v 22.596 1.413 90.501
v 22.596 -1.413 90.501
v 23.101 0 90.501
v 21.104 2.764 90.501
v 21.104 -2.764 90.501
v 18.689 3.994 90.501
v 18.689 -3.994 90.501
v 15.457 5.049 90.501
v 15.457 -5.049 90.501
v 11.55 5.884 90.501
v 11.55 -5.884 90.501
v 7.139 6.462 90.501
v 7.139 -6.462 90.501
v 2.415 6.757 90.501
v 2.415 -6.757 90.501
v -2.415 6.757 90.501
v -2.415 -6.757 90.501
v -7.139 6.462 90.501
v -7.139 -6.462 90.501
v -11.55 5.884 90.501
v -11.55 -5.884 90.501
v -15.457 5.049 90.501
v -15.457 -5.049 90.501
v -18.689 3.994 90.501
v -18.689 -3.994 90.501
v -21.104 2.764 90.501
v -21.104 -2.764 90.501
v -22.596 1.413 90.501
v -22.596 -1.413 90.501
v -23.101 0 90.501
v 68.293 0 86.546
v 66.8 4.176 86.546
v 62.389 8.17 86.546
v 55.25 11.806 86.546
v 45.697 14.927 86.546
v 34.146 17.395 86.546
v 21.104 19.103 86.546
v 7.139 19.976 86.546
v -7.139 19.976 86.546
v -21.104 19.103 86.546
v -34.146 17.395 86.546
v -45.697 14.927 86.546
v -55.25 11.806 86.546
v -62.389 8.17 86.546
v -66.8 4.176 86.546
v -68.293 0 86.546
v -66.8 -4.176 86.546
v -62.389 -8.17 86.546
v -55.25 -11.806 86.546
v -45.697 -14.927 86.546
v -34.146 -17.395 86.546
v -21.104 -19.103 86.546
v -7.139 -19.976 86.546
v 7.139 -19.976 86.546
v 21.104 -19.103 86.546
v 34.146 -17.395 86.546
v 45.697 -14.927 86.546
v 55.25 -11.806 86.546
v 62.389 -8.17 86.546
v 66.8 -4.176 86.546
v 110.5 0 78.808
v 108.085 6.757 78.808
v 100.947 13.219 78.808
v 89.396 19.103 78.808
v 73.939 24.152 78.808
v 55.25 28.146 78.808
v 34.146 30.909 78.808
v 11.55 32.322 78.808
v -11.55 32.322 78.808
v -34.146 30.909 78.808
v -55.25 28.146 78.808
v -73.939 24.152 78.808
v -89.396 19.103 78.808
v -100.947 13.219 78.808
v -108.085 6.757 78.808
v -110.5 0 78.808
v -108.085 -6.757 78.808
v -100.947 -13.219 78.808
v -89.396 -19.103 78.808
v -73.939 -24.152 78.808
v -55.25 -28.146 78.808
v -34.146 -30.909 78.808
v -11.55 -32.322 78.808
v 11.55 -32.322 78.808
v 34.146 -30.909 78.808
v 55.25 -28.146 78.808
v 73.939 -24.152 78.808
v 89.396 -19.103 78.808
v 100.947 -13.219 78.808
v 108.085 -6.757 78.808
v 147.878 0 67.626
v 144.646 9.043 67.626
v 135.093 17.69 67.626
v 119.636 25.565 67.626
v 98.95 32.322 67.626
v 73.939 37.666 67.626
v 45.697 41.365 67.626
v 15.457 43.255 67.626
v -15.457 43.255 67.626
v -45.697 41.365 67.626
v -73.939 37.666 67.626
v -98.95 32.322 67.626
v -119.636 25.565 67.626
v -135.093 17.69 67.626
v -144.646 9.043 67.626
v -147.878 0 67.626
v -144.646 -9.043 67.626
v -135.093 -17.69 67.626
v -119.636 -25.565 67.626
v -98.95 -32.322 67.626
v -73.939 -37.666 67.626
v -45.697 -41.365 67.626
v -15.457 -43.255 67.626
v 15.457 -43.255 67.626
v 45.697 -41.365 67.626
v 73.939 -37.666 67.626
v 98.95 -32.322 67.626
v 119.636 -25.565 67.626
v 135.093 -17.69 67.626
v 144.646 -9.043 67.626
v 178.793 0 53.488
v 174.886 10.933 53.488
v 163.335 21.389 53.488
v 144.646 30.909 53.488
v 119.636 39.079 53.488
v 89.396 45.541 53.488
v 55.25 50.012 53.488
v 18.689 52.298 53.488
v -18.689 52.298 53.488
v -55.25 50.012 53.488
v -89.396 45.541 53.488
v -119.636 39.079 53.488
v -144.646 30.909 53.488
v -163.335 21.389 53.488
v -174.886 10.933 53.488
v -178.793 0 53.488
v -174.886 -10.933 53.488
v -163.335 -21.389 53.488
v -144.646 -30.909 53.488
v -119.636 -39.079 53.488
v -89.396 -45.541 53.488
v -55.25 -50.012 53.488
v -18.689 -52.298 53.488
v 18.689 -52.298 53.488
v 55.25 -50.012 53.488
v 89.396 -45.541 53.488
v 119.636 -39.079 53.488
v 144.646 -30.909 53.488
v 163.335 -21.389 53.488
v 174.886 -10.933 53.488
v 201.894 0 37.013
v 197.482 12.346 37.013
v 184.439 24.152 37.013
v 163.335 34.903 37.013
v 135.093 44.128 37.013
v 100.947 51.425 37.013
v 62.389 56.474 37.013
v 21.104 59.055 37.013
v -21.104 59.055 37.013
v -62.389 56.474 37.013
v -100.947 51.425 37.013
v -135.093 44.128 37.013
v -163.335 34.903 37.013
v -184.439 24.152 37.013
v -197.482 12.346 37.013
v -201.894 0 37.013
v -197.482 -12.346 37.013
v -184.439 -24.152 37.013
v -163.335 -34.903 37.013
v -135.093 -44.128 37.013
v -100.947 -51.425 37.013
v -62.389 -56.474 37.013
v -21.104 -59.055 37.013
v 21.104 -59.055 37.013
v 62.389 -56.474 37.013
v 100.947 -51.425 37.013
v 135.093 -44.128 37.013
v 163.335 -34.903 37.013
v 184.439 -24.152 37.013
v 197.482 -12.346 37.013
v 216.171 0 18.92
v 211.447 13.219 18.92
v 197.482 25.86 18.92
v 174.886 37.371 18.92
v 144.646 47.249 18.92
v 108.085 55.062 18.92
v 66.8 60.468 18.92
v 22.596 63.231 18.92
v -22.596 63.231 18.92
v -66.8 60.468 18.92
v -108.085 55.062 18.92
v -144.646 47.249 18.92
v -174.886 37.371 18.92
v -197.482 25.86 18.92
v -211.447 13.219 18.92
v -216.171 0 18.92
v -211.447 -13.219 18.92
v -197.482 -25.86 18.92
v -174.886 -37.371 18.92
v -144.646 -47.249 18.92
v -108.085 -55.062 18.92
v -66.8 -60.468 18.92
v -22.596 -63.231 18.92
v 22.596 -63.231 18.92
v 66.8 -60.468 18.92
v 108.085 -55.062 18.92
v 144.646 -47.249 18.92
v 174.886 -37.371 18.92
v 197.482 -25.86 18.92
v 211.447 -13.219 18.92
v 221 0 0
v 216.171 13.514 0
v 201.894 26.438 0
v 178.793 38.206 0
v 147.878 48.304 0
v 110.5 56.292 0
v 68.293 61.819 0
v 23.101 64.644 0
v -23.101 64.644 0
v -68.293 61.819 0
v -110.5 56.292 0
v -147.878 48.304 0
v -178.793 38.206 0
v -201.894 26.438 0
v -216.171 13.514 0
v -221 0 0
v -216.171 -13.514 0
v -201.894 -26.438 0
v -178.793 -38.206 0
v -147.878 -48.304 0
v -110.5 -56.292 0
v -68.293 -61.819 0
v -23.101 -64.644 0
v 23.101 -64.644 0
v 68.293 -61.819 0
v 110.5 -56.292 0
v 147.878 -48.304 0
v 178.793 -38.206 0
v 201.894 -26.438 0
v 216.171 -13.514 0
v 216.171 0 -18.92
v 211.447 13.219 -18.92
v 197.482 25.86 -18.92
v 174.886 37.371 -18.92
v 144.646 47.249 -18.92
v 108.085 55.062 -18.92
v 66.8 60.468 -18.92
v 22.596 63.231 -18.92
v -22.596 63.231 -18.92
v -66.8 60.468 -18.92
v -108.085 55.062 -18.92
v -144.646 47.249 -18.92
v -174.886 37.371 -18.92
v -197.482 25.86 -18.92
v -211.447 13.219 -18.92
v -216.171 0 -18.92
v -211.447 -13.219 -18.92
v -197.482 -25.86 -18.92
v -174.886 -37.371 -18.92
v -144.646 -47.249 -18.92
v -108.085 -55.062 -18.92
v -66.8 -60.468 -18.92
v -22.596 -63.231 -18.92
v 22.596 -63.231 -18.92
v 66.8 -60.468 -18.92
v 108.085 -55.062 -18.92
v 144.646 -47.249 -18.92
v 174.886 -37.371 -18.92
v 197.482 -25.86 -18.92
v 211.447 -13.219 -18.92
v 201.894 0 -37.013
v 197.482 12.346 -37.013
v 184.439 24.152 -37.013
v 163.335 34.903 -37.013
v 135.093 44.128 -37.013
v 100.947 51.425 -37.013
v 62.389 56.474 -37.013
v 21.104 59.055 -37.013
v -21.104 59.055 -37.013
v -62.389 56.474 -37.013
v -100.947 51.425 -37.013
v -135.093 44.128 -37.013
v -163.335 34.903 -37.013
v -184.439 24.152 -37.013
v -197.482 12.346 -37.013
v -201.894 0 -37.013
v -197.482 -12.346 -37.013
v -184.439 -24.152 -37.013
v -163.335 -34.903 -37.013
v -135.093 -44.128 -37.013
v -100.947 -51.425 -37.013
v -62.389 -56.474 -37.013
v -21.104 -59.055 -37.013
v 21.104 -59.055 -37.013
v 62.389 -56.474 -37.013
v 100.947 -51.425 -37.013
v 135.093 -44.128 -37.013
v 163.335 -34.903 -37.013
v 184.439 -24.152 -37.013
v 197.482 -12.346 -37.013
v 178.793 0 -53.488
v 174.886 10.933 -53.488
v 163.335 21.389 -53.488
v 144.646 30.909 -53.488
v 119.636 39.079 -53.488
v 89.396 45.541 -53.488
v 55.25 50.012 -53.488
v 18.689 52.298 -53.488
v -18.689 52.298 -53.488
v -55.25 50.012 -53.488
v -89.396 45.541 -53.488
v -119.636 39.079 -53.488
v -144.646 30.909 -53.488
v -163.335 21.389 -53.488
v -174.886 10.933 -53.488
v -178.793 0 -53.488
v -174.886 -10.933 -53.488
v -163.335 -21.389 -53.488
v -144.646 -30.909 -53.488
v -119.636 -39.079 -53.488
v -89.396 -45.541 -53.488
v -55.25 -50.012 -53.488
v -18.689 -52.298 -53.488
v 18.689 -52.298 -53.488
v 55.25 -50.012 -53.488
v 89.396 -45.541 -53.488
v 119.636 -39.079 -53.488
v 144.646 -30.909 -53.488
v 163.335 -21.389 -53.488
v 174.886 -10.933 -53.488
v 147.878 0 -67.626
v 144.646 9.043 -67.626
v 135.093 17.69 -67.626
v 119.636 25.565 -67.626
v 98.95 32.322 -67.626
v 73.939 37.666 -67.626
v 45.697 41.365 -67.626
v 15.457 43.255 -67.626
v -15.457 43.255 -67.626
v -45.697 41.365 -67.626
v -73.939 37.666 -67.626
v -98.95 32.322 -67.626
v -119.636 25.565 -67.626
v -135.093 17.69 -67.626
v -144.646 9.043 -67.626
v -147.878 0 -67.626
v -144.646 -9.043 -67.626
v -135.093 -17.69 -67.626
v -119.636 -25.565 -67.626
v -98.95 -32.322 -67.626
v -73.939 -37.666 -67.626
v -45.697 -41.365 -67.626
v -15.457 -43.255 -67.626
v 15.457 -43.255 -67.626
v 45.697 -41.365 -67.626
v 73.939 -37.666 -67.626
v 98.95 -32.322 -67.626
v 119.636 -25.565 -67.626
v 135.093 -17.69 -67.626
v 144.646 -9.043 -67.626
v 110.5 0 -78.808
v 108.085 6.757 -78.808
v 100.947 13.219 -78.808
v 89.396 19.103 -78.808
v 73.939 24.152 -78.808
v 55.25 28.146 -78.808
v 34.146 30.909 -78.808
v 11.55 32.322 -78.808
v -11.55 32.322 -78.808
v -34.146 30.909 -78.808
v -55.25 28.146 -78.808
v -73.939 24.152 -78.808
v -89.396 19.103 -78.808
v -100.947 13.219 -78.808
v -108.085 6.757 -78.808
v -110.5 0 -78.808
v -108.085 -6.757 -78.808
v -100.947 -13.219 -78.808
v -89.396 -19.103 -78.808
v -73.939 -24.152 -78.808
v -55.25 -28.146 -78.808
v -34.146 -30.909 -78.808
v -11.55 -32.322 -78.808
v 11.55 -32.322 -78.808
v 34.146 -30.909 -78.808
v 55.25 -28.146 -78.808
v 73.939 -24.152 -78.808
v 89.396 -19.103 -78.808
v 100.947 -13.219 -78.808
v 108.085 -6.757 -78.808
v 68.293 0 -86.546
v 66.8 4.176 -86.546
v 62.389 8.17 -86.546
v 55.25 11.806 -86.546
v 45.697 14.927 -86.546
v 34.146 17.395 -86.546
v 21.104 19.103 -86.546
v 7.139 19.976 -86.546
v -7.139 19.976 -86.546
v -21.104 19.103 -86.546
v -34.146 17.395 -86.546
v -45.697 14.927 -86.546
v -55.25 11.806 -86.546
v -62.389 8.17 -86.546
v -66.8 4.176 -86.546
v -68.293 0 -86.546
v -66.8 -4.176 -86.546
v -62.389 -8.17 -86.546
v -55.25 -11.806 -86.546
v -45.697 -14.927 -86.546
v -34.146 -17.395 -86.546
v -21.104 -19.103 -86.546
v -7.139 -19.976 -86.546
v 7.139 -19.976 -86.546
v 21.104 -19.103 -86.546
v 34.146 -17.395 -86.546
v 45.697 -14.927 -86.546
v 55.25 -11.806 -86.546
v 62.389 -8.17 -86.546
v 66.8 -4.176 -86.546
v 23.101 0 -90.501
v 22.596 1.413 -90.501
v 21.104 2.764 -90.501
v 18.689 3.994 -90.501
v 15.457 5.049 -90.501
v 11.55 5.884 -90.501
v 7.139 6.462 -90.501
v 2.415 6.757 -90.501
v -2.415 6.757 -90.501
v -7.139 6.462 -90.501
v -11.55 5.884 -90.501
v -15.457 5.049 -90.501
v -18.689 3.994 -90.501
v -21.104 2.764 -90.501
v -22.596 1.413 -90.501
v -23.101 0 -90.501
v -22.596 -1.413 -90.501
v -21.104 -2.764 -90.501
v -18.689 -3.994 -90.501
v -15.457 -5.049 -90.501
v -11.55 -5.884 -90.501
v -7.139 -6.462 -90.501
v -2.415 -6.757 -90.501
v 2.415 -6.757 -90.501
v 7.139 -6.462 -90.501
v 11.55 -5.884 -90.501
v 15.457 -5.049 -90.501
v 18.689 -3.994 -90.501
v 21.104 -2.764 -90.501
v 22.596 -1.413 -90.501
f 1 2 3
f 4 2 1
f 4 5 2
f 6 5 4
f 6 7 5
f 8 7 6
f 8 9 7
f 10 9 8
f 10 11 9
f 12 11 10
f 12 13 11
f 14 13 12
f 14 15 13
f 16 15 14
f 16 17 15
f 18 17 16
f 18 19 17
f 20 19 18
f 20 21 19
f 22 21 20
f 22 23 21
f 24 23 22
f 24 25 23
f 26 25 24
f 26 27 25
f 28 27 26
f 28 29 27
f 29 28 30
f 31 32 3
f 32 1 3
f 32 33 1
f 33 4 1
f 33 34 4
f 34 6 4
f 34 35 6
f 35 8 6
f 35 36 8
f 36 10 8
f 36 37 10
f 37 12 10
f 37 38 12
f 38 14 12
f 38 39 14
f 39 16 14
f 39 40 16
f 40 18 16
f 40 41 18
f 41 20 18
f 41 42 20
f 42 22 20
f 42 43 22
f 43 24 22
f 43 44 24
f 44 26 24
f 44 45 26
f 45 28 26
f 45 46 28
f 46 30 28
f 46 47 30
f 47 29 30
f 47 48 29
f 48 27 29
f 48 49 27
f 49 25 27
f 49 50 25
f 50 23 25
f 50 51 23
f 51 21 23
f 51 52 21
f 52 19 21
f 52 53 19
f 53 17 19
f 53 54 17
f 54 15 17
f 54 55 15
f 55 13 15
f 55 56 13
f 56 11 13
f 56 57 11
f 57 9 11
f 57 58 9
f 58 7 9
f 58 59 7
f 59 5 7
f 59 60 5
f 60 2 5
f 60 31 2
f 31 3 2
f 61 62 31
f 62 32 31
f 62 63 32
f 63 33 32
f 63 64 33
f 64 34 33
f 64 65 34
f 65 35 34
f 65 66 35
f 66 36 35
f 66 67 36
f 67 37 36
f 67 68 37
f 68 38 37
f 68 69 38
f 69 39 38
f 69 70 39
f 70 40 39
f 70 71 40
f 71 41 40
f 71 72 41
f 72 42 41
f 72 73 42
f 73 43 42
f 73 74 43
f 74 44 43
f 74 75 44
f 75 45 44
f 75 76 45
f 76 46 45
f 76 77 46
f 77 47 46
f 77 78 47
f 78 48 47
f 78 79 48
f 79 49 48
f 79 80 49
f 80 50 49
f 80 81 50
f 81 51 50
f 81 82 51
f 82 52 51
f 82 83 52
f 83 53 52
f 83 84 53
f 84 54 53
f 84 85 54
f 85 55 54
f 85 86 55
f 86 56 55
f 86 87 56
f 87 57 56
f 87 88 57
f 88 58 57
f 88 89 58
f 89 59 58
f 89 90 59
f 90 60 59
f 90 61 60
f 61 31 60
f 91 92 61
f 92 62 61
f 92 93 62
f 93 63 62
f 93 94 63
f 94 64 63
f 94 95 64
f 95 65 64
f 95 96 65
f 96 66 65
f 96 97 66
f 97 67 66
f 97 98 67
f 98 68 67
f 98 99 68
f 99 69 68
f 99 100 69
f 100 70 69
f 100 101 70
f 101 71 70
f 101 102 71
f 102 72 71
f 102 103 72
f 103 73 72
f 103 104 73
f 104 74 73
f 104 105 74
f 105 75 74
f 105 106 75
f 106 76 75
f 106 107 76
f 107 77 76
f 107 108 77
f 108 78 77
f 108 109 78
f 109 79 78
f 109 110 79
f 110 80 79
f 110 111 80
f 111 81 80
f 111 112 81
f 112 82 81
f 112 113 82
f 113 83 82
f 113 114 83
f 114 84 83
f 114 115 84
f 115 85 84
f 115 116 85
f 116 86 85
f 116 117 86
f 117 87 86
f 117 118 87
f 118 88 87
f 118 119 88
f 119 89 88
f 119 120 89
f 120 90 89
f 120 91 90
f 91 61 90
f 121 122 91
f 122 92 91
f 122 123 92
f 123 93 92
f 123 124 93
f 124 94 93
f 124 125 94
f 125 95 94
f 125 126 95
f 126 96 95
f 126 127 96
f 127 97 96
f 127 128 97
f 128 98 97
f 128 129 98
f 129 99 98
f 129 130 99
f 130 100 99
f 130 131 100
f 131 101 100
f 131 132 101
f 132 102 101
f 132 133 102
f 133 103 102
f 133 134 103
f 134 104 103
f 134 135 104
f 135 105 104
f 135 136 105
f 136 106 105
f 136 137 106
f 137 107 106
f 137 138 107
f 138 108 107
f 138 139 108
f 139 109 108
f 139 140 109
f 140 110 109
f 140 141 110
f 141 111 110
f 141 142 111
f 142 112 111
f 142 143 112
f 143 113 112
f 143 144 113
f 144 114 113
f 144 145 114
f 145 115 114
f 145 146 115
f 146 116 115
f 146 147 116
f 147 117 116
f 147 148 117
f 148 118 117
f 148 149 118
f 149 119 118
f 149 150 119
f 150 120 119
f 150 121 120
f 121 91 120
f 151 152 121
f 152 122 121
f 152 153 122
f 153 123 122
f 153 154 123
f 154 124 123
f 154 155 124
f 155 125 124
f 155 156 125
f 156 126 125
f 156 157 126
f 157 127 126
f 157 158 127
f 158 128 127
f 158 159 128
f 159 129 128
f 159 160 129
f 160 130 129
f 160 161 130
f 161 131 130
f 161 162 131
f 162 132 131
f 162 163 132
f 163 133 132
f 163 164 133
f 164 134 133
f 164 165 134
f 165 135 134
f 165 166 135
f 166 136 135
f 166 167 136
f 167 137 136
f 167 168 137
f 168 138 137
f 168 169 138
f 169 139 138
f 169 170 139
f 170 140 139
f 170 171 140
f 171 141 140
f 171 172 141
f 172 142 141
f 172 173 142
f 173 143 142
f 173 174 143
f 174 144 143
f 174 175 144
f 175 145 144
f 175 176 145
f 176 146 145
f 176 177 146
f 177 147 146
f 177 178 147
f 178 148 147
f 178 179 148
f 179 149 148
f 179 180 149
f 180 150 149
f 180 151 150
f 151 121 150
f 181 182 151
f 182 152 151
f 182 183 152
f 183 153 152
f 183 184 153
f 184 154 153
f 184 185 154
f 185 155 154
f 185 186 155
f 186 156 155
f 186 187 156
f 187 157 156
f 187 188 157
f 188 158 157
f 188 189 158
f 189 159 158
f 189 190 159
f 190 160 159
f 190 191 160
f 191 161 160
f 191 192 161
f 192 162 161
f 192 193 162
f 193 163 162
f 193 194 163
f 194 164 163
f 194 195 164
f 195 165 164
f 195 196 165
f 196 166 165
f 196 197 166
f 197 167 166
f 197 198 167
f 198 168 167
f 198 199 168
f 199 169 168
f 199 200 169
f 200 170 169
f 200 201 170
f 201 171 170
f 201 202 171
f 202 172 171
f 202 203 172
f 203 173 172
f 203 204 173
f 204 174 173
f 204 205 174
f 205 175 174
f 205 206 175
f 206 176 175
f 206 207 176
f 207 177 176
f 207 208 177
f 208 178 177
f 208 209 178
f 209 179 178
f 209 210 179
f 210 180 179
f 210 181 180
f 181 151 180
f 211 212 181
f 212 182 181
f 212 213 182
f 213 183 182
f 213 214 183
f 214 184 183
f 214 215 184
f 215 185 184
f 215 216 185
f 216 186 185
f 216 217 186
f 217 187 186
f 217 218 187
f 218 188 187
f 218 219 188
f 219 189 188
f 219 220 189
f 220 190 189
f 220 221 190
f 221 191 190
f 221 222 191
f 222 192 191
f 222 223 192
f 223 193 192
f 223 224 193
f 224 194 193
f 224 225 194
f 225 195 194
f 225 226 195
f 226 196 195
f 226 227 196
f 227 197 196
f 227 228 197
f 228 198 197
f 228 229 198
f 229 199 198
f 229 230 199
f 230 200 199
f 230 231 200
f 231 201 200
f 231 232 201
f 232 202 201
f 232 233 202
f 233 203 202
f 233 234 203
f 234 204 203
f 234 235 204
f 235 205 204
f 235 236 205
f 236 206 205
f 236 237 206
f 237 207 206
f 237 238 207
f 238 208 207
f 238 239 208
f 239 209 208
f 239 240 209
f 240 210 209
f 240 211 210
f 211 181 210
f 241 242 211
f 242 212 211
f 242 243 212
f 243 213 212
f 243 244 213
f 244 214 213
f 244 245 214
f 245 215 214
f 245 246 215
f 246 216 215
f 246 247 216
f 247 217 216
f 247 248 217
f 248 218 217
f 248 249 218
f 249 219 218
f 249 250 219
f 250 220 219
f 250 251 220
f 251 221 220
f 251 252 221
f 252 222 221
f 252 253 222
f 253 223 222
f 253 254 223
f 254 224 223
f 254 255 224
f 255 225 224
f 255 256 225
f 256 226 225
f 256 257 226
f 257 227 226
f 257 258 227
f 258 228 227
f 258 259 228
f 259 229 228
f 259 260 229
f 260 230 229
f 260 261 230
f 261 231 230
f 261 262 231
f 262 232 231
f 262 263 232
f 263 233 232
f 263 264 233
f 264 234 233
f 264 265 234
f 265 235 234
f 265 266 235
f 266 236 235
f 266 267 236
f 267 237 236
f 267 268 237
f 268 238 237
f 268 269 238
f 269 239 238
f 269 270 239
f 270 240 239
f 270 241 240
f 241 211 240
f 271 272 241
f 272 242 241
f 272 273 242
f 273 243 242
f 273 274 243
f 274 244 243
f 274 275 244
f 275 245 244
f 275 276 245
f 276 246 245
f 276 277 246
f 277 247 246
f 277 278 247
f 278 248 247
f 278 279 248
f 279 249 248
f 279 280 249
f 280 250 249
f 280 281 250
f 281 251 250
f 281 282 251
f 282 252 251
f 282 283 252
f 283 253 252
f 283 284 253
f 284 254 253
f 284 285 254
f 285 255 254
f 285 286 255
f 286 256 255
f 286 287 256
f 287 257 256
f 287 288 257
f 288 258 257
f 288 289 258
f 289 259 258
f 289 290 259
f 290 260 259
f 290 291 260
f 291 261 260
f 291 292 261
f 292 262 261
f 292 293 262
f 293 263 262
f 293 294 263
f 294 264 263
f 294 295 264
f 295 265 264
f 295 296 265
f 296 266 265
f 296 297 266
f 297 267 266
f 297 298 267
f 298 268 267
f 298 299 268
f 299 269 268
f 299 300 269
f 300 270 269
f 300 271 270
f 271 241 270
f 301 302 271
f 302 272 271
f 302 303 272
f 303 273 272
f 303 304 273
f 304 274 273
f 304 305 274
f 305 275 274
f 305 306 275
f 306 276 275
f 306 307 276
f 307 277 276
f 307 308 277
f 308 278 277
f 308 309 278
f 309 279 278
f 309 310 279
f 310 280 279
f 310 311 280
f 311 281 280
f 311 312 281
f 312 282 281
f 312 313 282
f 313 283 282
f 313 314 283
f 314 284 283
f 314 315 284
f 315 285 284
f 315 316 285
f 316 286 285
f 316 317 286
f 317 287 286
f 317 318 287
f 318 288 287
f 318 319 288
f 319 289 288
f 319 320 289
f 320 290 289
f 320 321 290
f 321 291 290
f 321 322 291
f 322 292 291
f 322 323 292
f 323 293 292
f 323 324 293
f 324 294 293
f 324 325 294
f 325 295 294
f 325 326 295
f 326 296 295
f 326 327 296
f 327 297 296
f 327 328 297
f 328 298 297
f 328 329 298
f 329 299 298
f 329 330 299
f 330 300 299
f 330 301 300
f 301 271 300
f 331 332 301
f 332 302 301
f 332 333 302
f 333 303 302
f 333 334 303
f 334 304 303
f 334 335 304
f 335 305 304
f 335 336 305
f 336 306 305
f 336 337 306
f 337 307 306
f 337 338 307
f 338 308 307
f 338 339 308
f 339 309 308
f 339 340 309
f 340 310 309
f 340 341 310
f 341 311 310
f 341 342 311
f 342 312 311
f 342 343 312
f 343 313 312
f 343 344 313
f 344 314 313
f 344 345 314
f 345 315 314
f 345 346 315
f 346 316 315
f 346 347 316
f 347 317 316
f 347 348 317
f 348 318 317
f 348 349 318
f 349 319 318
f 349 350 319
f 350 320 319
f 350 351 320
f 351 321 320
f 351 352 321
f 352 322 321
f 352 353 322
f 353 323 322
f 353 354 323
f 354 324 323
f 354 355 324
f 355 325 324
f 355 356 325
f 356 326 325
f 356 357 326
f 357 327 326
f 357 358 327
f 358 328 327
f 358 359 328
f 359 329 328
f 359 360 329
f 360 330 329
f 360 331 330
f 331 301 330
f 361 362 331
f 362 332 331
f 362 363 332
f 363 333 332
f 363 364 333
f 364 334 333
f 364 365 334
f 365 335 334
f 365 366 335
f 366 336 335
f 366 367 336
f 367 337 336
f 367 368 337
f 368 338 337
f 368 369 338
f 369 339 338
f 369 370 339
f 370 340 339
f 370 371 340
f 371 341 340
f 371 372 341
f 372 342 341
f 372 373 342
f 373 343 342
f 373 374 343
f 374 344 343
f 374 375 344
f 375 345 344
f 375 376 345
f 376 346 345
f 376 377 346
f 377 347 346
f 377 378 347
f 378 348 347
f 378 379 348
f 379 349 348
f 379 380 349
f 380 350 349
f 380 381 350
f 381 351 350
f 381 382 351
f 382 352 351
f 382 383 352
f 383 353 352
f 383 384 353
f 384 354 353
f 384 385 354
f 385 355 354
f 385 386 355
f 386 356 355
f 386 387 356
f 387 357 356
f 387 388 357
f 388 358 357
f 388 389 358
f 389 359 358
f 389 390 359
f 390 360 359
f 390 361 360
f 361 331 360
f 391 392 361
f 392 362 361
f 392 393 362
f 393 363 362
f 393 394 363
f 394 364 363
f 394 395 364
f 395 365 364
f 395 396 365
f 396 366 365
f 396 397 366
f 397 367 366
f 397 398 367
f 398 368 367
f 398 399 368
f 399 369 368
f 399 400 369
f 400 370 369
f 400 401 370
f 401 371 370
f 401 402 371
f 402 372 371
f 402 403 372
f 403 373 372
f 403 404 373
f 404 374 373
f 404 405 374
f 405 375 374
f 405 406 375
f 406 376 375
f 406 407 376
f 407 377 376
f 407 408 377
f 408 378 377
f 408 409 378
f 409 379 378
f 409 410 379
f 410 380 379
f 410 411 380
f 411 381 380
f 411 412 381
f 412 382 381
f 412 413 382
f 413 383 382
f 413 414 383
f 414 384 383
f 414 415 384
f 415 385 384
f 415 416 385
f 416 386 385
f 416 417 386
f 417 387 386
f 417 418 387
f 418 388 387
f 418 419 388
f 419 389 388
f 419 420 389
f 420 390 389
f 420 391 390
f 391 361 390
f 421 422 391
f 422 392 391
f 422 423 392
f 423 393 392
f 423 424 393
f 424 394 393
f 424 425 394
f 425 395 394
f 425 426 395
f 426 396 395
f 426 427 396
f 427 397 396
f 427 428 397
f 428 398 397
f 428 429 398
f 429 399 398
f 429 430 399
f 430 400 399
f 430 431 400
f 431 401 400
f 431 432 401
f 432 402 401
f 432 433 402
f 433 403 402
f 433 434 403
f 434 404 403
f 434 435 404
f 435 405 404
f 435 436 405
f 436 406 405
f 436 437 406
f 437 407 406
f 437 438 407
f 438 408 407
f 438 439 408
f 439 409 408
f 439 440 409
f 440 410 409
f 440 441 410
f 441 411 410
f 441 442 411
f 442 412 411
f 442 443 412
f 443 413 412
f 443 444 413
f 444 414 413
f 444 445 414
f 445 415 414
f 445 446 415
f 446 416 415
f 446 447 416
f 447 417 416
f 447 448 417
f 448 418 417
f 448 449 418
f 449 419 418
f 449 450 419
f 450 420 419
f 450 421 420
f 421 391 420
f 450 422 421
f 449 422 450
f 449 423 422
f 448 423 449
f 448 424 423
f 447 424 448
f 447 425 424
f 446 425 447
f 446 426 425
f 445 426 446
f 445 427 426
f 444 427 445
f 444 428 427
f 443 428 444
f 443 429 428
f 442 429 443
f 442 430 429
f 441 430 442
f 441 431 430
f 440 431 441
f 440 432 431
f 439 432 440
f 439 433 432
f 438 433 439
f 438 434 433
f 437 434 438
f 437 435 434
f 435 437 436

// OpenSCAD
// Generated by SolidPython 1.0.1 on 2020-07-29 00:46:52


scale(v = [17, 5, 7]) {
	sphere(r = 13);
}
/***********************************************
*********      SolidPython code:      **********
************************************************
 
# import packages: SolidPython
from solid import *
from solid.utils import *
from itertools import chain, combinations, permutations


class Resize:

    def __init__(self, scad_file):
        self.scad_file = scad_file
        #self.scad_file = import_scad(scad_file)
        # cone/cylinder param:
        self.r1 = 0
        self.r2 = 0
        self.h = 0
        # rectangular prism param:
        self.w = 0
        self.l = 0
        # ellipse param:
        self.r = 0

    # import OpenScad code (file name corresponds to shape)


    # classify shape + parameters
    def assign(self, param1, param2, param3):
        if self.scad_file == 'cone.scad':
            self.r1 = param1
            self.r2 = param2
            self.h = param3
        elif self.scad_file == 'cylinder.scad':
            self.r1 = param1
            self.r2 = param2
            self.h = param3
        elif self.scad_file == 'rectangularPrism.scad':
            self.h = param1
            self.l = param2
            self.w = param3
        else:
            self.r = param1
            self.h = param2

    # resize parameters
    def iterate(self):
        x = range(3, 20, 2)
        i = 1
        if self.scad_file == 'cone.scad':
            tempList = list(permutations(x, 2))
            for temp in tempList:
                param1 = temp[0]
                param2 = temp[1]
                filepath = 'produced_scad_files/' + 'cone' + str(param1) + '_' + str(param2) + '_' + '.scad'
                scad_render_to_file(cylinder(h=param1, r1=param2, r2=0), filepath)

        elif self.scad_file == 'cylinder.scad':
            tempList = list(permutations(x, 3))
            for temp in tempList:
                param1 = temp[0]
                param2 = temp[1]
                filepath = 'produced_scad_files/' + 'cylinder' + str(param1) + '_' + str(param2) + '_' + '.scad'
                scad_render_to_file(cylinder(h=param1, r1=param2, r2=param2), filepath)

        elif self.scad_file == 'rectangularPrism.scad':
            tempList = list(permutations(x, 3))
            for temp in tempList:
                param1 = temp[0]
                param2 = temp[1]
                param3 = temp[2]
                filepath = 'produced_scad_files/' + 'rectangularPrism' + str(param1) + '_' + str(param2) + '_' + str(
                    param3) + '.scad'
                scad_render_to_file(cube(size=(param1, param2, param3)), filepath)

        elif self.scad_file == 'ellipse.scad':
            tempList = list(permutations(x, 4))
            for temp in tempList:
                param1 = temp[0]
                param2 = temp[1]
                param3 = temp[2]
                param4 = temp[3]
                filepath = 'produced_scad_files/' + 'ellipse' + str(param1) + '_' + str(param2) + '_' + str(param3) + '_' + str(param4) + '.scad'
                scad_render_to_file(scale([param1, param2, param3])(sphere(r=param4)), filepath)

    def render_to_scadfile(self):
        scad_render_to_file(scad, 'example.scad') 
 
************************************************/
